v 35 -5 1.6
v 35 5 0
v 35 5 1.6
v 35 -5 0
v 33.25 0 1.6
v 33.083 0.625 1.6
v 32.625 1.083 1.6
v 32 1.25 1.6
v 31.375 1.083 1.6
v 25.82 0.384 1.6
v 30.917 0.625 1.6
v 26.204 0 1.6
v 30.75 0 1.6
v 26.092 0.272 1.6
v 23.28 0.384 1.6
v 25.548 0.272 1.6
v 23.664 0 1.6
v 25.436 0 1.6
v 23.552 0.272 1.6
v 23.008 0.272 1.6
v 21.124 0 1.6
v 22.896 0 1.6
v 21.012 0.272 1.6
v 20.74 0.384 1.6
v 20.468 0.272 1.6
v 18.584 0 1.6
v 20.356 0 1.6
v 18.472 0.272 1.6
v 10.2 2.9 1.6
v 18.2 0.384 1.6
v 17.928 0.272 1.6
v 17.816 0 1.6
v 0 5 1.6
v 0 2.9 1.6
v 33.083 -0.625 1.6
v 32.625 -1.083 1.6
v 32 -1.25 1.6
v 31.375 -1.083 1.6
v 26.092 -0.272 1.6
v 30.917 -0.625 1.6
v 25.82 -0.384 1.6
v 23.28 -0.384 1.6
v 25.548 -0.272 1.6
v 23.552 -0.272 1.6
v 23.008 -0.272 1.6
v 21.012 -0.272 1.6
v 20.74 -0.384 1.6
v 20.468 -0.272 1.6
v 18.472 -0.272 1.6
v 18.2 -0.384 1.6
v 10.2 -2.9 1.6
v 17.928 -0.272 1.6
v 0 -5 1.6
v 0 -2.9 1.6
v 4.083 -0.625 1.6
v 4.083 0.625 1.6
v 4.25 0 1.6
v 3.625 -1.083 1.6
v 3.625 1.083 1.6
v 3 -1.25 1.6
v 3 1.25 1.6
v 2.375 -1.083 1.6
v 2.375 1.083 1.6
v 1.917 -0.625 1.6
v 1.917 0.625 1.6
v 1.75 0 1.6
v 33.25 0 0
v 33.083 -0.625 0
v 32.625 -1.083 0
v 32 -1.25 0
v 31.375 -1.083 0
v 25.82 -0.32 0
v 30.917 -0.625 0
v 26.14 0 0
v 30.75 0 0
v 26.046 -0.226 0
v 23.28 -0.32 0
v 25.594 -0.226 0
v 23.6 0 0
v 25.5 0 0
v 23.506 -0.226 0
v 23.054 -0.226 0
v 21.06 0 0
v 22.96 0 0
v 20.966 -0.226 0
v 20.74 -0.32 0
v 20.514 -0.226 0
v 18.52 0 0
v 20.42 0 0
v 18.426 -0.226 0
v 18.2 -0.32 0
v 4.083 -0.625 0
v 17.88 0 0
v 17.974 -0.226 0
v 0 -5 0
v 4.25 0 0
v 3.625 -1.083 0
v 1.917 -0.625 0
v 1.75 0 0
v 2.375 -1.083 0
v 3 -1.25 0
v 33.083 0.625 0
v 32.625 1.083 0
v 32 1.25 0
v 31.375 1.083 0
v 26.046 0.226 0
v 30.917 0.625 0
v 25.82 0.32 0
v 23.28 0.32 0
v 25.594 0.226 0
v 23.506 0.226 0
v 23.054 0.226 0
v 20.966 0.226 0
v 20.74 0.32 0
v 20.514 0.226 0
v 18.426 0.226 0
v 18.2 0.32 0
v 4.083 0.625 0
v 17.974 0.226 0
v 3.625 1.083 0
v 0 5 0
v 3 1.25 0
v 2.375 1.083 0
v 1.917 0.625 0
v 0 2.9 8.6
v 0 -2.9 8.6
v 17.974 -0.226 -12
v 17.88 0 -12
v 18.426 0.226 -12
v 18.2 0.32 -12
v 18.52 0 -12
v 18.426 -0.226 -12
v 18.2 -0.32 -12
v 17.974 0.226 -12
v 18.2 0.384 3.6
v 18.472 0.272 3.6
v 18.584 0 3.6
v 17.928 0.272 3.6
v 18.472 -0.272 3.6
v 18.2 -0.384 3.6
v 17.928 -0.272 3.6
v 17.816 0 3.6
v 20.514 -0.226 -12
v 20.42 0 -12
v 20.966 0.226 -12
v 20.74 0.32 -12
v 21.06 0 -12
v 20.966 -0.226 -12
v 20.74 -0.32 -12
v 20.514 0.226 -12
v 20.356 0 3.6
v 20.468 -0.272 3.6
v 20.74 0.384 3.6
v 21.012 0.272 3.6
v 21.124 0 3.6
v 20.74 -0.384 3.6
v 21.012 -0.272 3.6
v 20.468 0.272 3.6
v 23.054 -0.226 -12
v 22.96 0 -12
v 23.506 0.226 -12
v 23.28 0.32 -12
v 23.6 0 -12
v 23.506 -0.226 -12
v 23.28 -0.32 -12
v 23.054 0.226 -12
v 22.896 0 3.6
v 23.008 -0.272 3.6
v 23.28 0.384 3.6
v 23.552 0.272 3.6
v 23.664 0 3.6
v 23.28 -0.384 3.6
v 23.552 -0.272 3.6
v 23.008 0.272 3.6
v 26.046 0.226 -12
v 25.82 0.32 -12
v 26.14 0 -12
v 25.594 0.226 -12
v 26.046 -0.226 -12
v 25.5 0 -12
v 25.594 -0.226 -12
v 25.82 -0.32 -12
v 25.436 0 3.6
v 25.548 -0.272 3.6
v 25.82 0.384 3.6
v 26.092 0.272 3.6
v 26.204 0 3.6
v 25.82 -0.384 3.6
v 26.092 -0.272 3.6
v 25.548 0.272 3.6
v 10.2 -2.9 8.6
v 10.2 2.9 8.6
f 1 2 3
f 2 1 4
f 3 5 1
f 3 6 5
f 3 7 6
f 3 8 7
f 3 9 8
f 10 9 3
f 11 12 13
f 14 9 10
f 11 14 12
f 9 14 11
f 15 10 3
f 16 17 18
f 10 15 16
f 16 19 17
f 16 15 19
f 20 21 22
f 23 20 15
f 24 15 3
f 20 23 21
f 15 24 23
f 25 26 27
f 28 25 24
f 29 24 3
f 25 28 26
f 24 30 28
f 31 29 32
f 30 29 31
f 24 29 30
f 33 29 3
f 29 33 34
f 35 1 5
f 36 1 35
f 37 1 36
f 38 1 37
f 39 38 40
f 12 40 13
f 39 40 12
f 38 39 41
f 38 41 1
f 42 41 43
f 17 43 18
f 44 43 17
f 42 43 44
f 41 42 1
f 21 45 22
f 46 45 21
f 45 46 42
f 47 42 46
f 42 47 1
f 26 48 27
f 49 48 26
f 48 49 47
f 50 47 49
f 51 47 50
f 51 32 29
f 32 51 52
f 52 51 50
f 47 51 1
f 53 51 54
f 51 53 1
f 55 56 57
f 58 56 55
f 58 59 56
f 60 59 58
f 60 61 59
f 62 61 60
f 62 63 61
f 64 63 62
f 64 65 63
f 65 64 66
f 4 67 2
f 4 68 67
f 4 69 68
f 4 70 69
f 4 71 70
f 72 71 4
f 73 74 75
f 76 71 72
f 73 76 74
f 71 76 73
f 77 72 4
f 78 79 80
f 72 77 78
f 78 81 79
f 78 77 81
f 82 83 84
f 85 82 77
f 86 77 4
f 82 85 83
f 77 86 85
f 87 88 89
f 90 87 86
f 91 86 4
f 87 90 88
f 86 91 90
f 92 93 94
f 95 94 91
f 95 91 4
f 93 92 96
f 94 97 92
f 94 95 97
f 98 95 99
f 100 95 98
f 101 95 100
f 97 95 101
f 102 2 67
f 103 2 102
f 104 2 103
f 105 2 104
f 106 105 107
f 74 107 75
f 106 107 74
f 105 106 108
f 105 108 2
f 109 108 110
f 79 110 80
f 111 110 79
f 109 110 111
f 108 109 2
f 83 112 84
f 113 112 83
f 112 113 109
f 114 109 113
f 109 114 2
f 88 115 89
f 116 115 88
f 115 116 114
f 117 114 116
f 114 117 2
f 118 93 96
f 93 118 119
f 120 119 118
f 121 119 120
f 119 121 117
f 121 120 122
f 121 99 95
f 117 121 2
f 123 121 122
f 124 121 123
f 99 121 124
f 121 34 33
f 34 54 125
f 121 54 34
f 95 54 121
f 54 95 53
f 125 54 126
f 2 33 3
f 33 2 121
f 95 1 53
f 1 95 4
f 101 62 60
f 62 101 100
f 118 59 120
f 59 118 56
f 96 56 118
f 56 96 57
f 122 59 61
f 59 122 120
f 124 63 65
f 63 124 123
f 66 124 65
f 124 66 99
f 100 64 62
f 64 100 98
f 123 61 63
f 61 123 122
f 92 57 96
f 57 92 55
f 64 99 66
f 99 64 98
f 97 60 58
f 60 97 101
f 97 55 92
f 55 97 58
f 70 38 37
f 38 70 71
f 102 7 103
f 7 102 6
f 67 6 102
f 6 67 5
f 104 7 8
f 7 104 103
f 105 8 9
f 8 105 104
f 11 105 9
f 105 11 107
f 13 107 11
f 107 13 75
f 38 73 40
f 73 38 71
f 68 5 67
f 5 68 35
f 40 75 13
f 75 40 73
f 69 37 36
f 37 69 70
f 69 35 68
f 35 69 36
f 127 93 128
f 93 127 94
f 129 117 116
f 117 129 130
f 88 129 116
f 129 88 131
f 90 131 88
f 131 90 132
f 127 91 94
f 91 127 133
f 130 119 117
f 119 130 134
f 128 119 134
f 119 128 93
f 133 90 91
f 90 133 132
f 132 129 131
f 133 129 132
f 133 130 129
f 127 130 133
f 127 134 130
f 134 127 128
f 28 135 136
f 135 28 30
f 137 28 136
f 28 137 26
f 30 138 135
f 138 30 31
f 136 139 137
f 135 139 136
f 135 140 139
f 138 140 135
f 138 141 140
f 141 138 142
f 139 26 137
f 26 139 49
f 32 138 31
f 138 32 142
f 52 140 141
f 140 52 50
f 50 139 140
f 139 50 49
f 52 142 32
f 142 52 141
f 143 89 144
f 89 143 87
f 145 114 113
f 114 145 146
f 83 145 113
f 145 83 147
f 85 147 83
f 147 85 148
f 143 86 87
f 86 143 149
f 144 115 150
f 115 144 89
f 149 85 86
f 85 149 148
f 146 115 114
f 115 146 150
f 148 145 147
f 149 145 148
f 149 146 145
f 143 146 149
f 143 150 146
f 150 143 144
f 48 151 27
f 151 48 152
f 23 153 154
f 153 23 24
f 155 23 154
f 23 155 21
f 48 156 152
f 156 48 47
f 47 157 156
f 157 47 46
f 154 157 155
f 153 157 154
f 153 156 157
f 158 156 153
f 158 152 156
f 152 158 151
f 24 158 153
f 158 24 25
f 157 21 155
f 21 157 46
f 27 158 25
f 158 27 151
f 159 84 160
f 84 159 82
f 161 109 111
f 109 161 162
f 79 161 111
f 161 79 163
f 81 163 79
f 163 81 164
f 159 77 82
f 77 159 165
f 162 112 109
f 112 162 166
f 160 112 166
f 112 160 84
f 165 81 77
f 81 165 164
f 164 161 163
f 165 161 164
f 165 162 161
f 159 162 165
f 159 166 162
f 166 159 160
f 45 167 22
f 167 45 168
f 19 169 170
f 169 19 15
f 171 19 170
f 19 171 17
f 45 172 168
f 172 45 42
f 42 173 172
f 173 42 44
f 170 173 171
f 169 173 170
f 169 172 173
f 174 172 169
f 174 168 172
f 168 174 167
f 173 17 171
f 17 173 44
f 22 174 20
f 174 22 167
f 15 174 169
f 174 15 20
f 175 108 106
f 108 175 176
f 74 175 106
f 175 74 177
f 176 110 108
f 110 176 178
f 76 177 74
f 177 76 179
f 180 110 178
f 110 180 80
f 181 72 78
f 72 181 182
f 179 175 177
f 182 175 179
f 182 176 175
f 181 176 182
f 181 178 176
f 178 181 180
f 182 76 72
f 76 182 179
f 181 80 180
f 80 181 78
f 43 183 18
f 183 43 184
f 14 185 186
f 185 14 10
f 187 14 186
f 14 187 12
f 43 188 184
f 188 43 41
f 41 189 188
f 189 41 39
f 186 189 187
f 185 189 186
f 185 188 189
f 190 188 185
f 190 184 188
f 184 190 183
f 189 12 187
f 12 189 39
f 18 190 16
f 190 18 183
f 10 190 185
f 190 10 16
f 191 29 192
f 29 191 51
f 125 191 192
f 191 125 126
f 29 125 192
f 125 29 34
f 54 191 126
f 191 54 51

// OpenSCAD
// Cliff Sensor Module — TCRT5000 Reflective Optical Sensor
// iRobot Roomba 500/600/700/800/900 series — as used in OOMWOO BOM
//
// Datasheet-confirmed (TCRT5000 bare component):
//   10.2 x 5.8 x 7.0 mm (L x W x H)
// Module PCB dimensions (estimate, based on generic "MH sensor" module):
//   20 x 10 x 1.6 mm PCB + through-hole components
//
// Licensed CC0 — use freely.

// ===== PARAMETERS =====

// ---- Datasheet (TCRT5000 bare component) ----
sensor_l    = 10.2;  // mm (datasheet: Vishay TCRT5000 L dimension)
sensor_w    =  5.8;  // mm (datasheet: Vishay TCRT5000 W dimension)
sensor_h    =  7.0;  // mm (datasheet: Vishay TCRT5000 H dimension)

// ---- Module PCB (estimate: generic MH-style breakout) ----
pcb_l       = 35;    // mm (estimate: common TCRT5000 module board length)
pcb_w       = 10;    // mm (estimate: common TCRT5000 module board width)
pcb_thick   =  1.6;  // mm (estimate: standard FR4 1.6mm)
pcb_z_base  =  0;    // mm — reference plane

// ---- Mounting hole (estimate) ----
mount_hole_dia = 2.5; // mm (estimate: M2 screw clearance)
mount_hole_ofs_x = 3; // mm (estimate: hole center from board edge)

// ---- Pins (through-hole, bend or straight) ----
pin_count   =  4;    // (datasheet: emitter A/C + detector C/E)
pin_spacing =  2.54; // mm (estimate: standard 0.1" header pitch)
pin_dia     =  0.64; // mm (estimate: typical header pin)
pin_length  = 12;    // mm (estimate: exposed pin below PCB)

// ---- Comparator (LM393 on some modules — estimate) ----
comp_w      =  5;    // mm (estimate: SOIC-8 body width)
comp_l      =  5;    // mm (estimate: SOIC-8 body length)
comp_h      =  1.75; // mm (estimate: SOIC-8 height above PCB)
comp_ofs_x  =  6;    // mm (estimate: from PCB edge)
comp_ofs_y  =  0;    // mm (estimate: centered on PCB width)

// ---- Potentiometer (threshold adjust — estimate) ----
pot_dia     =  6;    // mm (estimate: 3296W trimmer pot diameter)
pot_h       =  4;    // mm (estimate: pot height above PCB)
pot_ofs_x   = 20;    // mm (estimate: along board)
pot_ofs_y   =  0;    // mm (estimate: centered)

// ---- Resistor network ----
r_width     =  1.6;  // mm (estimate: 0805 SMD resistor)
r_length    =  2.0;  // mm (estimate)
r_height    =  0.5;  // mm (estimate)

// Detection area marker (the sensor looks downward through this)
detect_offset_y =  0;  // mm — centered on board
detect_offset_z = -0.5; // mm — below PCB bottom (flush or slightly proud)

$fn = 16;

// ===== MODULES =====

module sensor_body() {
    // Vishay TCRT5000 in leaded package — the actual optosensor
    // Positioned at one end of the PCB, facing downward (-Z)
    // Centered on PCB midline
    color("DimGray") {
        translate([0, -sensor_w/2, pcb_thick])
            cube([sensor_l, sensor_w, sensor_h]);
    }
}

module pcb_board() {
    // FR4 PCB substrate
    color("DarkGreen", 0.85) {
        difference() {
            translate([0, -pcb_w/2, pcb_z_base])
                cube([pcb_l, pcb_w, pcb_thick]);
            // Mounting hole
            translate([mount_hole_ofs_x, 0, -0.1])
                cylinder(h=pcb_thick + 0.2, d=mount_hole_dia, $fn=12);
            translate([pcb_l - mount_hole_ofs_x, 0, -0.1])
                cylinder(h=pcb_thick + 0.2, d=mount_hole_dia, $fn=12);
        }
    }
}

module header_pins() {
    // 4 pins protruding below PCB — for socket or soldering
    for (i = [0 : pin_count - 1]) {
        translate([sensor_l + 8 + i * pin_spacing, 0, -pin_length])
            cylinder(h=pin_length, d=pin_dia, $fn=8);
        // Pin shoulder above PCB
        translate([sensor_l + 8 + i * pin_spacing, 0, pcb_thick])
            cylinder(h=2, d=pin_dia * 1.2, $fn=8);
    }
}

module comparator_ic() {
    // LM393 comparator (present on "MH" type modules)
    translate([comp_ofs_x, -comp_l/2, pcb_thick]) {
        color("Black")
            cube([comp_w, comp_l, comp_h]);
        // Pin legs
        for (ix = [0, 1])
            for (iy = [0, 1])
                translate([0.5 + ix * (comp_w - 1), 0.5 + iy * (comp_l - 1), -0.5])
                    cylinder(h=0.5, d=0.45, $fn=6);
    }
}

module potentiometer() {
    // Trimmer pot for sensitivity adjustment
    translate([pot_ofs_x, -pot_dia/2, pcb_thick]) {
        color("Blue")
            cylinder(h=pot_h, d=pot_dia);
    }
}

module smd_resistors() {
    // A few SMD resistors for circuit completion
    for (i = [0 : 3]) {
        translate([12 + i * 3, -pcb_w/2 + 2 + (i % 2) * 3, pcb_thick])
            color("Tan")
                cube([r_length, r_width, r_height]);
    }
}

module detection_cone() {
    // Visual indicator of the IR detection area (transparent cone)
    // Not for printing — just for reference in CAD
    translate([sensor_l/2, 0, -3]) {
        %cylinder(h=2, d1=sensor_w, d2=8, $fn=12);
    }
}

// ===== ASSEMBLY =====

module cliff_sensor() {
    pcb_board();
    sensor_body();
    header_pins();
    // Note: not all modules have all these components
    // Comment/uncomment as needed for your specific module
    // comparator_ic();
    // potentiometer();
    // smd_resistors();
    // detection_cone();
}

// ===== RENDER =====
cliff_sensor();

// ===== NOTES =====
// (1) Roomba cliff sensor modules typically have 4 wires (VCC, GND, signal).
//     The TCRT5000 itself has 4 pins (emitter A,C — detector C,E).
//     The sensor module often adds an LM393 comparator + potentiometer
//     for digital threshold output.
//
// (2) Roomba uses 4 cliff sensors (front-left, front-right, rear-left,
//     rear-right) mounted at the edges of the chassis, directed downward
//     at ~20-30° from vertical.
//
// (3) BOM: 4x cliff sensors bundle (AliExpress ~$1.50-2.50 each), includes
//     2x bumper switches. MEASURE actual module variant received.
